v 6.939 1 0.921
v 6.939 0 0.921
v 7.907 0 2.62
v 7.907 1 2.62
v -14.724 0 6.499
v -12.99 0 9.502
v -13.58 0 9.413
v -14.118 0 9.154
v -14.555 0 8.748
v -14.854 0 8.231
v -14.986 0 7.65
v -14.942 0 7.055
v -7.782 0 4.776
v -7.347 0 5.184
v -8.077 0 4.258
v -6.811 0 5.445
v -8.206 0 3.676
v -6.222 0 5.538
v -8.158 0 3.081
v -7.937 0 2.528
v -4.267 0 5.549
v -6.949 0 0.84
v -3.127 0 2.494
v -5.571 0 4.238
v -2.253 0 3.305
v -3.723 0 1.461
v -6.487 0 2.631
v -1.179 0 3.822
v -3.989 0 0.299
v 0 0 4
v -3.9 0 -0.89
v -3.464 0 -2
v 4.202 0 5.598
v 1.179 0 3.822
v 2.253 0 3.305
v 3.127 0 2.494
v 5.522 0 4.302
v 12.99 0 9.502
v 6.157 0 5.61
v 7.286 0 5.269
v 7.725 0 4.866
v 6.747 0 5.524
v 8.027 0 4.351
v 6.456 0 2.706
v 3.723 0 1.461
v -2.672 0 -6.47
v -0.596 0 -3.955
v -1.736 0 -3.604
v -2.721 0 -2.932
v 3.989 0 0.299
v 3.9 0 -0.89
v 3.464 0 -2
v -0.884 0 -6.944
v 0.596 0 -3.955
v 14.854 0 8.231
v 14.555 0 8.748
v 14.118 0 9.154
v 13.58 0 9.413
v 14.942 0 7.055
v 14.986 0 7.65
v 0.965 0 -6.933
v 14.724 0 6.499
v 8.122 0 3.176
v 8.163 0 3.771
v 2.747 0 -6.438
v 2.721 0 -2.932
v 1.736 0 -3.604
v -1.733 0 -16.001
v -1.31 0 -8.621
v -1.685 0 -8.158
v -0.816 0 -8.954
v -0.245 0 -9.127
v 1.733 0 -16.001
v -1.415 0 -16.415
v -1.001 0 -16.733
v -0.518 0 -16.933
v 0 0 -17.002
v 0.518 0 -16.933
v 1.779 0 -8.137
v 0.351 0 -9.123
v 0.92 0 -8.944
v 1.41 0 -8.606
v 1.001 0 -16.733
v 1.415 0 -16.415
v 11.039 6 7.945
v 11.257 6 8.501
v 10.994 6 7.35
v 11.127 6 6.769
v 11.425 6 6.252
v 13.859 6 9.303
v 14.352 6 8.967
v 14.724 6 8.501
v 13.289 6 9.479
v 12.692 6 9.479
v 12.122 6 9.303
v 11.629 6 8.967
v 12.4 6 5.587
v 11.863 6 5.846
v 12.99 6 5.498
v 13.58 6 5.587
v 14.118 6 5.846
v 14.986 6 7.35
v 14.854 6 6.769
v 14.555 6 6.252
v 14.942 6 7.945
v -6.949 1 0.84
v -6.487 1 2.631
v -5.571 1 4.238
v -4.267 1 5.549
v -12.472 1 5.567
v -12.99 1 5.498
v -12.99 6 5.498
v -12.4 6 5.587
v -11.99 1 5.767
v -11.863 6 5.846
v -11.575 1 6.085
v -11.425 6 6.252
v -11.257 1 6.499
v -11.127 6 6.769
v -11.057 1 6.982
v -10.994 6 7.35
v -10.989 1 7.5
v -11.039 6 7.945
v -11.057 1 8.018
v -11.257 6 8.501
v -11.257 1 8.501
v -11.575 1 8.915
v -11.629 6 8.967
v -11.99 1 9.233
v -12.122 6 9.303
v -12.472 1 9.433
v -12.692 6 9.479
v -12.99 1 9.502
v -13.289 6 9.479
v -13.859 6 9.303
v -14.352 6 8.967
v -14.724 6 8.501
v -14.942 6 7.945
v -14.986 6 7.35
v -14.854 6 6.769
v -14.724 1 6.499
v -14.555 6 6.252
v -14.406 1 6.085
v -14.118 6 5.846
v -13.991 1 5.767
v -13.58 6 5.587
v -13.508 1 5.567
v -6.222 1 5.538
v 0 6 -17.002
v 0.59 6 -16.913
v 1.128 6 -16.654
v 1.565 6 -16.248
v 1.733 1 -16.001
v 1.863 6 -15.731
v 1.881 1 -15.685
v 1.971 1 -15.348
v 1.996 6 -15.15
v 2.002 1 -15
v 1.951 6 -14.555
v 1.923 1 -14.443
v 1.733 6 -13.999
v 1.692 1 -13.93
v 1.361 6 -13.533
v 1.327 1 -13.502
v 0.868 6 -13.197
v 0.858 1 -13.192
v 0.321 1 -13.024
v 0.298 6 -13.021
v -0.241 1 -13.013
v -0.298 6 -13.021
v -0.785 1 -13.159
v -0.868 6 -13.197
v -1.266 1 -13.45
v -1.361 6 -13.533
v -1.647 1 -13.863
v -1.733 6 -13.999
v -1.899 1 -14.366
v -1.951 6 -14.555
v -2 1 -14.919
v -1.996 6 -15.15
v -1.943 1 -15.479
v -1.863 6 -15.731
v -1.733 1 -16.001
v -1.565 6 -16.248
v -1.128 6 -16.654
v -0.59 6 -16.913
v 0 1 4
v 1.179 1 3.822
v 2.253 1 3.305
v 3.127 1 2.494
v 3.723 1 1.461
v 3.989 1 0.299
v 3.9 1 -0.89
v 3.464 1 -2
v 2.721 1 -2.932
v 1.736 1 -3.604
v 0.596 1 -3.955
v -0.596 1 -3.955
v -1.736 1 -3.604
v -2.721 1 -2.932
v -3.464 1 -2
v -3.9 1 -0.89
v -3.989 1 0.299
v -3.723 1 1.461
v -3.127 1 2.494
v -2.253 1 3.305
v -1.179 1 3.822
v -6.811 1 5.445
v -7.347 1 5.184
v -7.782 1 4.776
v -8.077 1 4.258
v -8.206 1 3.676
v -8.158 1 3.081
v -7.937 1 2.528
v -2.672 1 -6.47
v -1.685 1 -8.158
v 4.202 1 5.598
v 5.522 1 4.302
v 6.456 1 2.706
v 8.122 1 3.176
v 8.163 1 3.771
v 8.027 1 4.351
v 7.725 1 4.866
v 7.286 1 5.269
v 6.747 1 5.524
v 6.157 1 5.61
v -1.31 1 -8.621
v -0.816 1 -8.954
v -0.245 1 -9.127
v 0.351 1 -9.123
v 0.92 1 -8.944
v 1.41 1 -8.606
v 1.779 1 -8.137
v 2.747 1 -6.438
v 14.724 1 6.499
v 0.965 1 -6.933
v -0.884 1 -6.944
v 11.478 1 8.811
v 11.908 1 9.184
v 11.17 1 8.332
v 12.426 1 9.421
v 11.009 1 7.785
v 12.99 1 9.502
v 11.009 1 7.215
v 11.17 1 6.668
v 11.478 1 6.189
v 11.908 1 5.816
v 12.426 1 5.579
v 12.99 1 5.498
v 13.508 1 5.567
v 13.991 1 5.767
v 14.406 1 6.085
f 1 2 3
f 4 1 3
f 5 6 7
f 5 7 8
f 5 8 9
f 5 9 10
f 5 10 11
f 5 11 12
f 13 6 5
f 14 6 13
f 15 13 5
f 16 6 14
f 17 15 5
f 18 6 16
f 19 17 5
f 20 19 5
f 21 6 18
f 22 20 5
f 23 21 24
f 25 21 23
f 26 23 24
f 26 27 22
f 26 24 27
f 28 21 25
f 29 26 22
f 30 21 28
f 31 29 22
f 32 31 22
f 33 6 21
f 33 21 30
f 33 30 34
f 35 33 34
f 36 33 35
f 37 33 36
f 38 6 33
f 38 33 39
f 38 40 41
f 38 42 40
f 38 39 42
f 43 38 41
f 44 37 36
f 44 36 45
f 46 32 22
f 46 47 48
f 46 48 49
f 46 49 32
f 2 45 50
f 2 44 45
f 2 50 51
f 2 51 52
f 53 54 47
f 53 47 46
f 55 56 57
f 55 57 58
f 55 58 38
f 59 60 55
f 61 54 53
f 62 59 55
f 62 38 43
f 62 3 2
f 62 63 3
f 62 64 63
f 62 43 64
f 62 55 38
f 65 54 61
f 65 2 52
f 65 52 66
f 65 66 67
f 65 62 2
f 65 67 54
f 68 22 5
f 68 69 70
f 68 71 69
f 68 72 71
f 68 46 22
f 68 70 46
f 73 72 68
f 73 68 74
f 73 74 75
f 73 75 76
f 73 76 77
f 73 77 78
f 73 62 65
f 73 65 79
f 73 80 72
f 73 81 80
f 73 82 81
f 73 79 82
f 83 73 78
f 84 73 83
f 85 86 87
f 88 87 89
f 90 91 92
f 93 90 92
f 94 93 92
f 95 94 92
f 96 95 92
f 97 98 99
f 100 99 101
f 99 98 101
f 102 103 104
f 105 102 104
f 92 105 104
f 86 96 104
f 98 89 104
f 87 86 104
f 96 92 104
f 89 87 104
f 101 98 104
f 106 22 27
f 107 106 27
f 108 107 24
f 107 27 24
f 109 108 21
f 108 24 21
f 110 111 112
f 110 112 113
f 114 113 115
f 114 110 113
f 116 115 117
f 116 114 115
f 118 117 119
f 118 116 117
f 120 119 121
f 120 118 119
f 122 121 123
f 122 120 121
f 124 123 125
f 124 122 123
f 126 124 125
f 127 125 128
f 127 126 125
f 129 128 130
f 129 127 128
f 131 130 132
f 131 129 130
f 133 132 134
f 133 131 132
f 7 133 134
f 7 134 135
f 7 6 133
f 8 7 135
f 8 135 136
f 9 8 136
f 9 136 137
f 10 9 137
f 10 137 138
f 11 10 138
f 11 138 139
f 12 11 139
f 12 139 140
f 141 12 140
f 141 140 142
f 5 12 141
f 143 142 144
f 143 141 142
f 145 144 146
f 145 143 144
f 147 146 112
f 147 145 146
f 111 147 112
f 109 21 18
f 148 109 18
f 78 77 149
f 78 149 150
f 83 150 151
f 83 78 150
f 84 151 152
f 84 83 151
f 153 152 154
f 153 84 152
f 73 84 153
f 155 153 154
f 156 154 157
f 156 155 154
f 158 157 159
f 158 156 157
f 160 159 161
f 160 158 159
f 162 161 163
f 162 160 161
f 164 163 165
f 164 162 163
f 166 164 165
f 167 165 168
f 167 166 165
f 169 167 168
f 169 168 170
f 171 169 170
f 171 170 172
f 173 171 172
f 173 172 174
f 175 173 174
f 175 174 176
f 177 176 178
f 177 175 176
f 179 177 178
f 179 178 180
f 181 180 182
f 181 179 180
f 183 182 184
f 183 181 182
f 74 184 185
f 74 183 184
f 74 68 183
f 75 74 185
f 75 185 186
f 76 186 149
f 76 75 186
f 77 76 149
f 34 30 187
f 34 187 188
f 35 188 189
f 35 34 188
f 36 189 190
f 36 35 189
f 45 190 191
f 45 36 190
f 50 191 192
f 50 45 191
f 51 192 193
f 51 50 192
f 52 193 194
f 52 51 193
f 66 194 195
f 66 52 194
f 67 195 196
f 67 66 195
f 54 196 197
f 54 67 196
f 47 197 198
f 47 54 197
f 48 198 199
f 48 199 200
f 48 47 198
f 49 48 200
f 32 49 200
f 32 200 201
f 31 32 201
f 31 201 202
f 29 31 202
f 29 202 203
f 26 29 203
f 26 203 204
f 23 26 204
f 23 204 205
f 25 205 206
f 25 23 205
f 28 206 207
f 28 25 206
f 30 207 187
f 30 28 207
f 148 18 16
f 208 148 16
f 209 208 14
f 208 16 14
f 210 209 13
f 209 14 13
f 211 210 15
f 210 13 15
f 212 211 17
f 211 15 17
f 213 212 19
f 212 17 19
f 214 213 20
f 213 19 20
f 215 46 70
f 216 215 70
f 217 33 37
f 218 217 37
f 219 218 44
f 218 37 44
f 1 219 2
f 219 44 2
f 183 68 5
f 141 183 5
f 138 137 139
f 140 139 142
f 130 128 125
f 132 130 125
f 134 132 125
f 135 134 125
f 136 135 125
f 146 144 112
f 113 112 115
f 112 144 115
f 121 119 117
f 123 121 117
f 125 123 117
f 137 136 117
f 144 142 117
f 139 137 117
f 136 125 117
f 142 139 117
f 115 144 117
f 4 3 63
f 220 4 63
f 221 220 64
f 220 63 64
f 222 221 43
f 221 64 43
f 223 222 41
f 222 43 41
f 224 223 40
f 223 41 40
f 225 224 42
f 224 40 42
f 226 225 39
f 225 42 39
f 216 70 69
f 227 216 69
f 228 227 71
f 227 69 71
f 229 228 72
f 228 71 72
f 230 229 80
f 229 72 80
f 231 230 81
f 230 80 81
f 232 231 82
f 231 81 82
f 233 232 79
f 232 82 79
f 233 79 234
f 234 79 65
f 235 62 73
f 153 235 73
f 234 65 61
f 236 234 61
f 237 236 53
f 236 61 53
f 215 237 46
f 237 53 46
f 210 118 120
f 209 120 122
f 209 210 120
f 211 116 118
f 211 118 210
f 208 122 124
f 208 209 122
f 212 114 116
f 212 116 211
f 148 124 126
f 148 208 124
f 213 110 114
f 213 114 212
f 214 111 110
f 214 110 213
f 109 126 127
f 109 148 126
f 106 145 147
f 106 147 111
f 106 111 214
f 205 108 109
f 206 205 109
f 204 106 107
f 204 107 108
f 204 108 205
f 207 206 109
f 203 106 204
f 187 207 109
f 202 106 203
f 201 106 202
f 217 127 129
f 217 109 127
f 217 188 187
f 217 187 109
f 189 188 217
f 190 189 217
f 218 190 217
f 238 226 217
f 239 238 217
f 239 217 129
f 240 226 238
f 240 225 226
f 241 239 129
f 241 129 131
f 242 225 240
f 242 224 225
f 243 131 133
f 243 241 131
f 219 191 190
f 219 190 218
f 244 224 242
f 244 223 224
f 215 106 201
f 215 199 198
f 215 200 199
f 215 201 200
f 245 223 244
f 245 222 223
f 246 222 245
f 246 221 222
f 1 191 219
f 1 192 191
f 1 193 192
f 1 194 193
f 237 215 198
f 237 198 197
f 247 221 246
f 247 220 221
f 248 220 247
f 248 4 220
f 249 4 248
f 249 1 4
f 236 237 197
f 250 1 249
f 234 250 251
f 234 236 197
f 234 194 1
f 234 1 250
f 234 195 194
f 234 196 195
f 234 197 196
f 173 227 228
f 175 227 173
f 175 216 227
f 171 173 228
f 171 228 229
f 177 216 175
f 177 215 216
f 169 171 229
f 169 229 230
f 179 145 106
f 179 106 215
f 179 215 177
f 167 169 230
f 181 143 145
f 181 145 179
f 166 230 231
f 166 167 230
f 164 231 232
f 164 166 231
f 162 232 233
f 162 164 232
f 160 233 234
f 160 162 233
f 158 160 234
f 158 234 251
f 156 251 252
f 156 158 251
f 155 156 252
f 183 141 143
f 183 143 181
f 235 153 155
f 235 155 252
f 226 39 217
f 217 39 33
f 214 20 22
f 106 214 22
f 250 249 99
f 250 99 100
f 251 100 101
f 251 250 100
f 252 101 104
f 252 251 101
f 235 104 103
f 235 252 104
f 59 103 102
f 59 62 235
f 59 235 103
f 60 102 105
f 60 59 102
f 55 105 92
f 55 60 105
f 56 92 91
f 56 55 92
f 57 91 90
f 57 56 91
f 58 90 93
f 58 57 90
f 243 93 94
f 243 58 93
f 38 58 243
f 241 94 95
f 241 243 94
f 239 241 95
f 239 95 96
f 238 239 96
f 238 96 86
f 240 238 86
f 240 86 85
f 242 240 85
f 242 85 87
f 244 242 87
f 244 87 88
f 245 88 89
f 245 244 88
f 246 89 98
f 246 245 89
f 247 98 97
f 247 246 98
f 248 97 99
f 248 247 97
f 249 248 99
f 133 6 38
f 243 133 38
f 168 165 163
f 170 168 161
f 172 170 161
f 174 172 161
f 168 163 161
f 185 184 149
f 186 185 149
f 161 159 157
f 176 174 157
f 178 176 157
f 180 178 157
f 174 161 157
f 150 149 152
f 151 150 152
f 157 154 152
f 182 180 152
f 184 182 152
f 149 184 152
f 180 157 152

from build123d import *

# Parameters (mm, degrees)
SKETCH1_R           = 4
BOSS_EXTRUDE1_DEPTH = 1
SKETCH3_R           = 2.001662742
BOSS_EXTRUDE2_DEPTH = 6


with BuildPart() as part:
    # Sketch1 → Boss-Extrude1 (new body)
    with BuildSketch(Plane(origin=(0, 0, 0), x_dir=(1, 0, 0), z_dir=(0, 1, 0))):
        with BuildLine():
            Line((-1.733490784, 16.000831371), (-14.723871841, -6.499168629))
            ThreePointArc((-14.723871841, -6.499168629), (-12.472312617, -5.566542262), (-10.988718315, -7.5))
            ThreePointArc((-10.988718315, -7.5), (-11.574991759, -8.915389298), (-12.990381057, -9.501662742))
            Line((-12.990381057, -9.501662742), (12.990381057, -9.501662742))
            ThreePointArc((12.990381057, -9.501662742), (11.256890273, -6.499168629), (14.723871841, -6.499168629))
            Line((14.723871841, -6.499168629), (1.733490784, 16.000831371))
            ThreePointArc((1.733490784, 16.000831371), (1.933457738, 15.518068439), (2.001662742, 15))
            ThreePointArc((2.001662742, 15), (-0.518068439, 13.066542262), (-1.733490784, 16.000831371))
        make_face()
        with BuildLine():
            ThreePointArc((-6.22231578, -5.537682874), (-7.948518941, -4.527622159), (-7.936882283, -2.527656013))
            Line((-7.936882283, -2.527656013), (-6.949410322, -0.840057244))
            ThreePointArc((-6.949410322, -0.840057244), (-6.082439366, -3.464669011), (-4.267076395, -5.549059293))
            Line((-4.267076395, -5.549059293), (-6.22231578, -5.537682874))
        make_face(mode=Mode.SUBTRACT)
        with Locations(Location((0, 0, 0), (0, 0, 270))):
            Circle(SKETCH1_R, mode=Mode.SUBTRACT)
        with BuildLine():
            ThreePointArc((7.906931938, -2.619842099), (7.895295279, -4.619808246), (6.15745546, -5.609713677))
            Line((6.15745546, -5.609713677), (4.202216075, -5.598337258))
            ThreePointArc((4.202216075, -5.598337258), (6.041711062, -3.535212503), (6.939164513, -0.920866911))
            Line((6.939164513, -0.920866911), (7.906931938, -2.619842099))
        make_face(mode=Mode.SUBTRACT)
        with BuildLine():
            ThreePointArc((-1.684616157, 8.157524973), (0.053223662, 9.147430405), (1.779426822, 8.13736969))
            Line((1.779426822, 8.13736969), (2.747194247, 6.438394502))
            ThreePointArc((2.747194247, 6.438394502), (0.040728304, 6.999881514), (-2.672088118, 6.469926204))
            Line((-2.672088118, 6.469926204), (-1.684616157, 8.157524973))
        make_face(mode=Mode.SUBTRACT)
    extrude(amount=BOSS_EXTRUDE1_DEPTH)

    # Sketch3 → Boss-Extrude2 (add)
    with BuildSketch(Plane.XZ):
        with Locations(Location((-12.990381057, 7.5, 0), (0, 0, 270))):
            Circle(SKETCH3_R)
        with Locations(Location((12.990381057, 7.5, 0), (0, 0, 270))):
            Circle(SKETCH3_R)
        with Locations(Location((0, -15, 0), (0, 0, 270))):
            Circle(SKETCH3_R)
    extrude(amount=-BOSS_EXTRUDE2_DEPTH)


solid = part.part
